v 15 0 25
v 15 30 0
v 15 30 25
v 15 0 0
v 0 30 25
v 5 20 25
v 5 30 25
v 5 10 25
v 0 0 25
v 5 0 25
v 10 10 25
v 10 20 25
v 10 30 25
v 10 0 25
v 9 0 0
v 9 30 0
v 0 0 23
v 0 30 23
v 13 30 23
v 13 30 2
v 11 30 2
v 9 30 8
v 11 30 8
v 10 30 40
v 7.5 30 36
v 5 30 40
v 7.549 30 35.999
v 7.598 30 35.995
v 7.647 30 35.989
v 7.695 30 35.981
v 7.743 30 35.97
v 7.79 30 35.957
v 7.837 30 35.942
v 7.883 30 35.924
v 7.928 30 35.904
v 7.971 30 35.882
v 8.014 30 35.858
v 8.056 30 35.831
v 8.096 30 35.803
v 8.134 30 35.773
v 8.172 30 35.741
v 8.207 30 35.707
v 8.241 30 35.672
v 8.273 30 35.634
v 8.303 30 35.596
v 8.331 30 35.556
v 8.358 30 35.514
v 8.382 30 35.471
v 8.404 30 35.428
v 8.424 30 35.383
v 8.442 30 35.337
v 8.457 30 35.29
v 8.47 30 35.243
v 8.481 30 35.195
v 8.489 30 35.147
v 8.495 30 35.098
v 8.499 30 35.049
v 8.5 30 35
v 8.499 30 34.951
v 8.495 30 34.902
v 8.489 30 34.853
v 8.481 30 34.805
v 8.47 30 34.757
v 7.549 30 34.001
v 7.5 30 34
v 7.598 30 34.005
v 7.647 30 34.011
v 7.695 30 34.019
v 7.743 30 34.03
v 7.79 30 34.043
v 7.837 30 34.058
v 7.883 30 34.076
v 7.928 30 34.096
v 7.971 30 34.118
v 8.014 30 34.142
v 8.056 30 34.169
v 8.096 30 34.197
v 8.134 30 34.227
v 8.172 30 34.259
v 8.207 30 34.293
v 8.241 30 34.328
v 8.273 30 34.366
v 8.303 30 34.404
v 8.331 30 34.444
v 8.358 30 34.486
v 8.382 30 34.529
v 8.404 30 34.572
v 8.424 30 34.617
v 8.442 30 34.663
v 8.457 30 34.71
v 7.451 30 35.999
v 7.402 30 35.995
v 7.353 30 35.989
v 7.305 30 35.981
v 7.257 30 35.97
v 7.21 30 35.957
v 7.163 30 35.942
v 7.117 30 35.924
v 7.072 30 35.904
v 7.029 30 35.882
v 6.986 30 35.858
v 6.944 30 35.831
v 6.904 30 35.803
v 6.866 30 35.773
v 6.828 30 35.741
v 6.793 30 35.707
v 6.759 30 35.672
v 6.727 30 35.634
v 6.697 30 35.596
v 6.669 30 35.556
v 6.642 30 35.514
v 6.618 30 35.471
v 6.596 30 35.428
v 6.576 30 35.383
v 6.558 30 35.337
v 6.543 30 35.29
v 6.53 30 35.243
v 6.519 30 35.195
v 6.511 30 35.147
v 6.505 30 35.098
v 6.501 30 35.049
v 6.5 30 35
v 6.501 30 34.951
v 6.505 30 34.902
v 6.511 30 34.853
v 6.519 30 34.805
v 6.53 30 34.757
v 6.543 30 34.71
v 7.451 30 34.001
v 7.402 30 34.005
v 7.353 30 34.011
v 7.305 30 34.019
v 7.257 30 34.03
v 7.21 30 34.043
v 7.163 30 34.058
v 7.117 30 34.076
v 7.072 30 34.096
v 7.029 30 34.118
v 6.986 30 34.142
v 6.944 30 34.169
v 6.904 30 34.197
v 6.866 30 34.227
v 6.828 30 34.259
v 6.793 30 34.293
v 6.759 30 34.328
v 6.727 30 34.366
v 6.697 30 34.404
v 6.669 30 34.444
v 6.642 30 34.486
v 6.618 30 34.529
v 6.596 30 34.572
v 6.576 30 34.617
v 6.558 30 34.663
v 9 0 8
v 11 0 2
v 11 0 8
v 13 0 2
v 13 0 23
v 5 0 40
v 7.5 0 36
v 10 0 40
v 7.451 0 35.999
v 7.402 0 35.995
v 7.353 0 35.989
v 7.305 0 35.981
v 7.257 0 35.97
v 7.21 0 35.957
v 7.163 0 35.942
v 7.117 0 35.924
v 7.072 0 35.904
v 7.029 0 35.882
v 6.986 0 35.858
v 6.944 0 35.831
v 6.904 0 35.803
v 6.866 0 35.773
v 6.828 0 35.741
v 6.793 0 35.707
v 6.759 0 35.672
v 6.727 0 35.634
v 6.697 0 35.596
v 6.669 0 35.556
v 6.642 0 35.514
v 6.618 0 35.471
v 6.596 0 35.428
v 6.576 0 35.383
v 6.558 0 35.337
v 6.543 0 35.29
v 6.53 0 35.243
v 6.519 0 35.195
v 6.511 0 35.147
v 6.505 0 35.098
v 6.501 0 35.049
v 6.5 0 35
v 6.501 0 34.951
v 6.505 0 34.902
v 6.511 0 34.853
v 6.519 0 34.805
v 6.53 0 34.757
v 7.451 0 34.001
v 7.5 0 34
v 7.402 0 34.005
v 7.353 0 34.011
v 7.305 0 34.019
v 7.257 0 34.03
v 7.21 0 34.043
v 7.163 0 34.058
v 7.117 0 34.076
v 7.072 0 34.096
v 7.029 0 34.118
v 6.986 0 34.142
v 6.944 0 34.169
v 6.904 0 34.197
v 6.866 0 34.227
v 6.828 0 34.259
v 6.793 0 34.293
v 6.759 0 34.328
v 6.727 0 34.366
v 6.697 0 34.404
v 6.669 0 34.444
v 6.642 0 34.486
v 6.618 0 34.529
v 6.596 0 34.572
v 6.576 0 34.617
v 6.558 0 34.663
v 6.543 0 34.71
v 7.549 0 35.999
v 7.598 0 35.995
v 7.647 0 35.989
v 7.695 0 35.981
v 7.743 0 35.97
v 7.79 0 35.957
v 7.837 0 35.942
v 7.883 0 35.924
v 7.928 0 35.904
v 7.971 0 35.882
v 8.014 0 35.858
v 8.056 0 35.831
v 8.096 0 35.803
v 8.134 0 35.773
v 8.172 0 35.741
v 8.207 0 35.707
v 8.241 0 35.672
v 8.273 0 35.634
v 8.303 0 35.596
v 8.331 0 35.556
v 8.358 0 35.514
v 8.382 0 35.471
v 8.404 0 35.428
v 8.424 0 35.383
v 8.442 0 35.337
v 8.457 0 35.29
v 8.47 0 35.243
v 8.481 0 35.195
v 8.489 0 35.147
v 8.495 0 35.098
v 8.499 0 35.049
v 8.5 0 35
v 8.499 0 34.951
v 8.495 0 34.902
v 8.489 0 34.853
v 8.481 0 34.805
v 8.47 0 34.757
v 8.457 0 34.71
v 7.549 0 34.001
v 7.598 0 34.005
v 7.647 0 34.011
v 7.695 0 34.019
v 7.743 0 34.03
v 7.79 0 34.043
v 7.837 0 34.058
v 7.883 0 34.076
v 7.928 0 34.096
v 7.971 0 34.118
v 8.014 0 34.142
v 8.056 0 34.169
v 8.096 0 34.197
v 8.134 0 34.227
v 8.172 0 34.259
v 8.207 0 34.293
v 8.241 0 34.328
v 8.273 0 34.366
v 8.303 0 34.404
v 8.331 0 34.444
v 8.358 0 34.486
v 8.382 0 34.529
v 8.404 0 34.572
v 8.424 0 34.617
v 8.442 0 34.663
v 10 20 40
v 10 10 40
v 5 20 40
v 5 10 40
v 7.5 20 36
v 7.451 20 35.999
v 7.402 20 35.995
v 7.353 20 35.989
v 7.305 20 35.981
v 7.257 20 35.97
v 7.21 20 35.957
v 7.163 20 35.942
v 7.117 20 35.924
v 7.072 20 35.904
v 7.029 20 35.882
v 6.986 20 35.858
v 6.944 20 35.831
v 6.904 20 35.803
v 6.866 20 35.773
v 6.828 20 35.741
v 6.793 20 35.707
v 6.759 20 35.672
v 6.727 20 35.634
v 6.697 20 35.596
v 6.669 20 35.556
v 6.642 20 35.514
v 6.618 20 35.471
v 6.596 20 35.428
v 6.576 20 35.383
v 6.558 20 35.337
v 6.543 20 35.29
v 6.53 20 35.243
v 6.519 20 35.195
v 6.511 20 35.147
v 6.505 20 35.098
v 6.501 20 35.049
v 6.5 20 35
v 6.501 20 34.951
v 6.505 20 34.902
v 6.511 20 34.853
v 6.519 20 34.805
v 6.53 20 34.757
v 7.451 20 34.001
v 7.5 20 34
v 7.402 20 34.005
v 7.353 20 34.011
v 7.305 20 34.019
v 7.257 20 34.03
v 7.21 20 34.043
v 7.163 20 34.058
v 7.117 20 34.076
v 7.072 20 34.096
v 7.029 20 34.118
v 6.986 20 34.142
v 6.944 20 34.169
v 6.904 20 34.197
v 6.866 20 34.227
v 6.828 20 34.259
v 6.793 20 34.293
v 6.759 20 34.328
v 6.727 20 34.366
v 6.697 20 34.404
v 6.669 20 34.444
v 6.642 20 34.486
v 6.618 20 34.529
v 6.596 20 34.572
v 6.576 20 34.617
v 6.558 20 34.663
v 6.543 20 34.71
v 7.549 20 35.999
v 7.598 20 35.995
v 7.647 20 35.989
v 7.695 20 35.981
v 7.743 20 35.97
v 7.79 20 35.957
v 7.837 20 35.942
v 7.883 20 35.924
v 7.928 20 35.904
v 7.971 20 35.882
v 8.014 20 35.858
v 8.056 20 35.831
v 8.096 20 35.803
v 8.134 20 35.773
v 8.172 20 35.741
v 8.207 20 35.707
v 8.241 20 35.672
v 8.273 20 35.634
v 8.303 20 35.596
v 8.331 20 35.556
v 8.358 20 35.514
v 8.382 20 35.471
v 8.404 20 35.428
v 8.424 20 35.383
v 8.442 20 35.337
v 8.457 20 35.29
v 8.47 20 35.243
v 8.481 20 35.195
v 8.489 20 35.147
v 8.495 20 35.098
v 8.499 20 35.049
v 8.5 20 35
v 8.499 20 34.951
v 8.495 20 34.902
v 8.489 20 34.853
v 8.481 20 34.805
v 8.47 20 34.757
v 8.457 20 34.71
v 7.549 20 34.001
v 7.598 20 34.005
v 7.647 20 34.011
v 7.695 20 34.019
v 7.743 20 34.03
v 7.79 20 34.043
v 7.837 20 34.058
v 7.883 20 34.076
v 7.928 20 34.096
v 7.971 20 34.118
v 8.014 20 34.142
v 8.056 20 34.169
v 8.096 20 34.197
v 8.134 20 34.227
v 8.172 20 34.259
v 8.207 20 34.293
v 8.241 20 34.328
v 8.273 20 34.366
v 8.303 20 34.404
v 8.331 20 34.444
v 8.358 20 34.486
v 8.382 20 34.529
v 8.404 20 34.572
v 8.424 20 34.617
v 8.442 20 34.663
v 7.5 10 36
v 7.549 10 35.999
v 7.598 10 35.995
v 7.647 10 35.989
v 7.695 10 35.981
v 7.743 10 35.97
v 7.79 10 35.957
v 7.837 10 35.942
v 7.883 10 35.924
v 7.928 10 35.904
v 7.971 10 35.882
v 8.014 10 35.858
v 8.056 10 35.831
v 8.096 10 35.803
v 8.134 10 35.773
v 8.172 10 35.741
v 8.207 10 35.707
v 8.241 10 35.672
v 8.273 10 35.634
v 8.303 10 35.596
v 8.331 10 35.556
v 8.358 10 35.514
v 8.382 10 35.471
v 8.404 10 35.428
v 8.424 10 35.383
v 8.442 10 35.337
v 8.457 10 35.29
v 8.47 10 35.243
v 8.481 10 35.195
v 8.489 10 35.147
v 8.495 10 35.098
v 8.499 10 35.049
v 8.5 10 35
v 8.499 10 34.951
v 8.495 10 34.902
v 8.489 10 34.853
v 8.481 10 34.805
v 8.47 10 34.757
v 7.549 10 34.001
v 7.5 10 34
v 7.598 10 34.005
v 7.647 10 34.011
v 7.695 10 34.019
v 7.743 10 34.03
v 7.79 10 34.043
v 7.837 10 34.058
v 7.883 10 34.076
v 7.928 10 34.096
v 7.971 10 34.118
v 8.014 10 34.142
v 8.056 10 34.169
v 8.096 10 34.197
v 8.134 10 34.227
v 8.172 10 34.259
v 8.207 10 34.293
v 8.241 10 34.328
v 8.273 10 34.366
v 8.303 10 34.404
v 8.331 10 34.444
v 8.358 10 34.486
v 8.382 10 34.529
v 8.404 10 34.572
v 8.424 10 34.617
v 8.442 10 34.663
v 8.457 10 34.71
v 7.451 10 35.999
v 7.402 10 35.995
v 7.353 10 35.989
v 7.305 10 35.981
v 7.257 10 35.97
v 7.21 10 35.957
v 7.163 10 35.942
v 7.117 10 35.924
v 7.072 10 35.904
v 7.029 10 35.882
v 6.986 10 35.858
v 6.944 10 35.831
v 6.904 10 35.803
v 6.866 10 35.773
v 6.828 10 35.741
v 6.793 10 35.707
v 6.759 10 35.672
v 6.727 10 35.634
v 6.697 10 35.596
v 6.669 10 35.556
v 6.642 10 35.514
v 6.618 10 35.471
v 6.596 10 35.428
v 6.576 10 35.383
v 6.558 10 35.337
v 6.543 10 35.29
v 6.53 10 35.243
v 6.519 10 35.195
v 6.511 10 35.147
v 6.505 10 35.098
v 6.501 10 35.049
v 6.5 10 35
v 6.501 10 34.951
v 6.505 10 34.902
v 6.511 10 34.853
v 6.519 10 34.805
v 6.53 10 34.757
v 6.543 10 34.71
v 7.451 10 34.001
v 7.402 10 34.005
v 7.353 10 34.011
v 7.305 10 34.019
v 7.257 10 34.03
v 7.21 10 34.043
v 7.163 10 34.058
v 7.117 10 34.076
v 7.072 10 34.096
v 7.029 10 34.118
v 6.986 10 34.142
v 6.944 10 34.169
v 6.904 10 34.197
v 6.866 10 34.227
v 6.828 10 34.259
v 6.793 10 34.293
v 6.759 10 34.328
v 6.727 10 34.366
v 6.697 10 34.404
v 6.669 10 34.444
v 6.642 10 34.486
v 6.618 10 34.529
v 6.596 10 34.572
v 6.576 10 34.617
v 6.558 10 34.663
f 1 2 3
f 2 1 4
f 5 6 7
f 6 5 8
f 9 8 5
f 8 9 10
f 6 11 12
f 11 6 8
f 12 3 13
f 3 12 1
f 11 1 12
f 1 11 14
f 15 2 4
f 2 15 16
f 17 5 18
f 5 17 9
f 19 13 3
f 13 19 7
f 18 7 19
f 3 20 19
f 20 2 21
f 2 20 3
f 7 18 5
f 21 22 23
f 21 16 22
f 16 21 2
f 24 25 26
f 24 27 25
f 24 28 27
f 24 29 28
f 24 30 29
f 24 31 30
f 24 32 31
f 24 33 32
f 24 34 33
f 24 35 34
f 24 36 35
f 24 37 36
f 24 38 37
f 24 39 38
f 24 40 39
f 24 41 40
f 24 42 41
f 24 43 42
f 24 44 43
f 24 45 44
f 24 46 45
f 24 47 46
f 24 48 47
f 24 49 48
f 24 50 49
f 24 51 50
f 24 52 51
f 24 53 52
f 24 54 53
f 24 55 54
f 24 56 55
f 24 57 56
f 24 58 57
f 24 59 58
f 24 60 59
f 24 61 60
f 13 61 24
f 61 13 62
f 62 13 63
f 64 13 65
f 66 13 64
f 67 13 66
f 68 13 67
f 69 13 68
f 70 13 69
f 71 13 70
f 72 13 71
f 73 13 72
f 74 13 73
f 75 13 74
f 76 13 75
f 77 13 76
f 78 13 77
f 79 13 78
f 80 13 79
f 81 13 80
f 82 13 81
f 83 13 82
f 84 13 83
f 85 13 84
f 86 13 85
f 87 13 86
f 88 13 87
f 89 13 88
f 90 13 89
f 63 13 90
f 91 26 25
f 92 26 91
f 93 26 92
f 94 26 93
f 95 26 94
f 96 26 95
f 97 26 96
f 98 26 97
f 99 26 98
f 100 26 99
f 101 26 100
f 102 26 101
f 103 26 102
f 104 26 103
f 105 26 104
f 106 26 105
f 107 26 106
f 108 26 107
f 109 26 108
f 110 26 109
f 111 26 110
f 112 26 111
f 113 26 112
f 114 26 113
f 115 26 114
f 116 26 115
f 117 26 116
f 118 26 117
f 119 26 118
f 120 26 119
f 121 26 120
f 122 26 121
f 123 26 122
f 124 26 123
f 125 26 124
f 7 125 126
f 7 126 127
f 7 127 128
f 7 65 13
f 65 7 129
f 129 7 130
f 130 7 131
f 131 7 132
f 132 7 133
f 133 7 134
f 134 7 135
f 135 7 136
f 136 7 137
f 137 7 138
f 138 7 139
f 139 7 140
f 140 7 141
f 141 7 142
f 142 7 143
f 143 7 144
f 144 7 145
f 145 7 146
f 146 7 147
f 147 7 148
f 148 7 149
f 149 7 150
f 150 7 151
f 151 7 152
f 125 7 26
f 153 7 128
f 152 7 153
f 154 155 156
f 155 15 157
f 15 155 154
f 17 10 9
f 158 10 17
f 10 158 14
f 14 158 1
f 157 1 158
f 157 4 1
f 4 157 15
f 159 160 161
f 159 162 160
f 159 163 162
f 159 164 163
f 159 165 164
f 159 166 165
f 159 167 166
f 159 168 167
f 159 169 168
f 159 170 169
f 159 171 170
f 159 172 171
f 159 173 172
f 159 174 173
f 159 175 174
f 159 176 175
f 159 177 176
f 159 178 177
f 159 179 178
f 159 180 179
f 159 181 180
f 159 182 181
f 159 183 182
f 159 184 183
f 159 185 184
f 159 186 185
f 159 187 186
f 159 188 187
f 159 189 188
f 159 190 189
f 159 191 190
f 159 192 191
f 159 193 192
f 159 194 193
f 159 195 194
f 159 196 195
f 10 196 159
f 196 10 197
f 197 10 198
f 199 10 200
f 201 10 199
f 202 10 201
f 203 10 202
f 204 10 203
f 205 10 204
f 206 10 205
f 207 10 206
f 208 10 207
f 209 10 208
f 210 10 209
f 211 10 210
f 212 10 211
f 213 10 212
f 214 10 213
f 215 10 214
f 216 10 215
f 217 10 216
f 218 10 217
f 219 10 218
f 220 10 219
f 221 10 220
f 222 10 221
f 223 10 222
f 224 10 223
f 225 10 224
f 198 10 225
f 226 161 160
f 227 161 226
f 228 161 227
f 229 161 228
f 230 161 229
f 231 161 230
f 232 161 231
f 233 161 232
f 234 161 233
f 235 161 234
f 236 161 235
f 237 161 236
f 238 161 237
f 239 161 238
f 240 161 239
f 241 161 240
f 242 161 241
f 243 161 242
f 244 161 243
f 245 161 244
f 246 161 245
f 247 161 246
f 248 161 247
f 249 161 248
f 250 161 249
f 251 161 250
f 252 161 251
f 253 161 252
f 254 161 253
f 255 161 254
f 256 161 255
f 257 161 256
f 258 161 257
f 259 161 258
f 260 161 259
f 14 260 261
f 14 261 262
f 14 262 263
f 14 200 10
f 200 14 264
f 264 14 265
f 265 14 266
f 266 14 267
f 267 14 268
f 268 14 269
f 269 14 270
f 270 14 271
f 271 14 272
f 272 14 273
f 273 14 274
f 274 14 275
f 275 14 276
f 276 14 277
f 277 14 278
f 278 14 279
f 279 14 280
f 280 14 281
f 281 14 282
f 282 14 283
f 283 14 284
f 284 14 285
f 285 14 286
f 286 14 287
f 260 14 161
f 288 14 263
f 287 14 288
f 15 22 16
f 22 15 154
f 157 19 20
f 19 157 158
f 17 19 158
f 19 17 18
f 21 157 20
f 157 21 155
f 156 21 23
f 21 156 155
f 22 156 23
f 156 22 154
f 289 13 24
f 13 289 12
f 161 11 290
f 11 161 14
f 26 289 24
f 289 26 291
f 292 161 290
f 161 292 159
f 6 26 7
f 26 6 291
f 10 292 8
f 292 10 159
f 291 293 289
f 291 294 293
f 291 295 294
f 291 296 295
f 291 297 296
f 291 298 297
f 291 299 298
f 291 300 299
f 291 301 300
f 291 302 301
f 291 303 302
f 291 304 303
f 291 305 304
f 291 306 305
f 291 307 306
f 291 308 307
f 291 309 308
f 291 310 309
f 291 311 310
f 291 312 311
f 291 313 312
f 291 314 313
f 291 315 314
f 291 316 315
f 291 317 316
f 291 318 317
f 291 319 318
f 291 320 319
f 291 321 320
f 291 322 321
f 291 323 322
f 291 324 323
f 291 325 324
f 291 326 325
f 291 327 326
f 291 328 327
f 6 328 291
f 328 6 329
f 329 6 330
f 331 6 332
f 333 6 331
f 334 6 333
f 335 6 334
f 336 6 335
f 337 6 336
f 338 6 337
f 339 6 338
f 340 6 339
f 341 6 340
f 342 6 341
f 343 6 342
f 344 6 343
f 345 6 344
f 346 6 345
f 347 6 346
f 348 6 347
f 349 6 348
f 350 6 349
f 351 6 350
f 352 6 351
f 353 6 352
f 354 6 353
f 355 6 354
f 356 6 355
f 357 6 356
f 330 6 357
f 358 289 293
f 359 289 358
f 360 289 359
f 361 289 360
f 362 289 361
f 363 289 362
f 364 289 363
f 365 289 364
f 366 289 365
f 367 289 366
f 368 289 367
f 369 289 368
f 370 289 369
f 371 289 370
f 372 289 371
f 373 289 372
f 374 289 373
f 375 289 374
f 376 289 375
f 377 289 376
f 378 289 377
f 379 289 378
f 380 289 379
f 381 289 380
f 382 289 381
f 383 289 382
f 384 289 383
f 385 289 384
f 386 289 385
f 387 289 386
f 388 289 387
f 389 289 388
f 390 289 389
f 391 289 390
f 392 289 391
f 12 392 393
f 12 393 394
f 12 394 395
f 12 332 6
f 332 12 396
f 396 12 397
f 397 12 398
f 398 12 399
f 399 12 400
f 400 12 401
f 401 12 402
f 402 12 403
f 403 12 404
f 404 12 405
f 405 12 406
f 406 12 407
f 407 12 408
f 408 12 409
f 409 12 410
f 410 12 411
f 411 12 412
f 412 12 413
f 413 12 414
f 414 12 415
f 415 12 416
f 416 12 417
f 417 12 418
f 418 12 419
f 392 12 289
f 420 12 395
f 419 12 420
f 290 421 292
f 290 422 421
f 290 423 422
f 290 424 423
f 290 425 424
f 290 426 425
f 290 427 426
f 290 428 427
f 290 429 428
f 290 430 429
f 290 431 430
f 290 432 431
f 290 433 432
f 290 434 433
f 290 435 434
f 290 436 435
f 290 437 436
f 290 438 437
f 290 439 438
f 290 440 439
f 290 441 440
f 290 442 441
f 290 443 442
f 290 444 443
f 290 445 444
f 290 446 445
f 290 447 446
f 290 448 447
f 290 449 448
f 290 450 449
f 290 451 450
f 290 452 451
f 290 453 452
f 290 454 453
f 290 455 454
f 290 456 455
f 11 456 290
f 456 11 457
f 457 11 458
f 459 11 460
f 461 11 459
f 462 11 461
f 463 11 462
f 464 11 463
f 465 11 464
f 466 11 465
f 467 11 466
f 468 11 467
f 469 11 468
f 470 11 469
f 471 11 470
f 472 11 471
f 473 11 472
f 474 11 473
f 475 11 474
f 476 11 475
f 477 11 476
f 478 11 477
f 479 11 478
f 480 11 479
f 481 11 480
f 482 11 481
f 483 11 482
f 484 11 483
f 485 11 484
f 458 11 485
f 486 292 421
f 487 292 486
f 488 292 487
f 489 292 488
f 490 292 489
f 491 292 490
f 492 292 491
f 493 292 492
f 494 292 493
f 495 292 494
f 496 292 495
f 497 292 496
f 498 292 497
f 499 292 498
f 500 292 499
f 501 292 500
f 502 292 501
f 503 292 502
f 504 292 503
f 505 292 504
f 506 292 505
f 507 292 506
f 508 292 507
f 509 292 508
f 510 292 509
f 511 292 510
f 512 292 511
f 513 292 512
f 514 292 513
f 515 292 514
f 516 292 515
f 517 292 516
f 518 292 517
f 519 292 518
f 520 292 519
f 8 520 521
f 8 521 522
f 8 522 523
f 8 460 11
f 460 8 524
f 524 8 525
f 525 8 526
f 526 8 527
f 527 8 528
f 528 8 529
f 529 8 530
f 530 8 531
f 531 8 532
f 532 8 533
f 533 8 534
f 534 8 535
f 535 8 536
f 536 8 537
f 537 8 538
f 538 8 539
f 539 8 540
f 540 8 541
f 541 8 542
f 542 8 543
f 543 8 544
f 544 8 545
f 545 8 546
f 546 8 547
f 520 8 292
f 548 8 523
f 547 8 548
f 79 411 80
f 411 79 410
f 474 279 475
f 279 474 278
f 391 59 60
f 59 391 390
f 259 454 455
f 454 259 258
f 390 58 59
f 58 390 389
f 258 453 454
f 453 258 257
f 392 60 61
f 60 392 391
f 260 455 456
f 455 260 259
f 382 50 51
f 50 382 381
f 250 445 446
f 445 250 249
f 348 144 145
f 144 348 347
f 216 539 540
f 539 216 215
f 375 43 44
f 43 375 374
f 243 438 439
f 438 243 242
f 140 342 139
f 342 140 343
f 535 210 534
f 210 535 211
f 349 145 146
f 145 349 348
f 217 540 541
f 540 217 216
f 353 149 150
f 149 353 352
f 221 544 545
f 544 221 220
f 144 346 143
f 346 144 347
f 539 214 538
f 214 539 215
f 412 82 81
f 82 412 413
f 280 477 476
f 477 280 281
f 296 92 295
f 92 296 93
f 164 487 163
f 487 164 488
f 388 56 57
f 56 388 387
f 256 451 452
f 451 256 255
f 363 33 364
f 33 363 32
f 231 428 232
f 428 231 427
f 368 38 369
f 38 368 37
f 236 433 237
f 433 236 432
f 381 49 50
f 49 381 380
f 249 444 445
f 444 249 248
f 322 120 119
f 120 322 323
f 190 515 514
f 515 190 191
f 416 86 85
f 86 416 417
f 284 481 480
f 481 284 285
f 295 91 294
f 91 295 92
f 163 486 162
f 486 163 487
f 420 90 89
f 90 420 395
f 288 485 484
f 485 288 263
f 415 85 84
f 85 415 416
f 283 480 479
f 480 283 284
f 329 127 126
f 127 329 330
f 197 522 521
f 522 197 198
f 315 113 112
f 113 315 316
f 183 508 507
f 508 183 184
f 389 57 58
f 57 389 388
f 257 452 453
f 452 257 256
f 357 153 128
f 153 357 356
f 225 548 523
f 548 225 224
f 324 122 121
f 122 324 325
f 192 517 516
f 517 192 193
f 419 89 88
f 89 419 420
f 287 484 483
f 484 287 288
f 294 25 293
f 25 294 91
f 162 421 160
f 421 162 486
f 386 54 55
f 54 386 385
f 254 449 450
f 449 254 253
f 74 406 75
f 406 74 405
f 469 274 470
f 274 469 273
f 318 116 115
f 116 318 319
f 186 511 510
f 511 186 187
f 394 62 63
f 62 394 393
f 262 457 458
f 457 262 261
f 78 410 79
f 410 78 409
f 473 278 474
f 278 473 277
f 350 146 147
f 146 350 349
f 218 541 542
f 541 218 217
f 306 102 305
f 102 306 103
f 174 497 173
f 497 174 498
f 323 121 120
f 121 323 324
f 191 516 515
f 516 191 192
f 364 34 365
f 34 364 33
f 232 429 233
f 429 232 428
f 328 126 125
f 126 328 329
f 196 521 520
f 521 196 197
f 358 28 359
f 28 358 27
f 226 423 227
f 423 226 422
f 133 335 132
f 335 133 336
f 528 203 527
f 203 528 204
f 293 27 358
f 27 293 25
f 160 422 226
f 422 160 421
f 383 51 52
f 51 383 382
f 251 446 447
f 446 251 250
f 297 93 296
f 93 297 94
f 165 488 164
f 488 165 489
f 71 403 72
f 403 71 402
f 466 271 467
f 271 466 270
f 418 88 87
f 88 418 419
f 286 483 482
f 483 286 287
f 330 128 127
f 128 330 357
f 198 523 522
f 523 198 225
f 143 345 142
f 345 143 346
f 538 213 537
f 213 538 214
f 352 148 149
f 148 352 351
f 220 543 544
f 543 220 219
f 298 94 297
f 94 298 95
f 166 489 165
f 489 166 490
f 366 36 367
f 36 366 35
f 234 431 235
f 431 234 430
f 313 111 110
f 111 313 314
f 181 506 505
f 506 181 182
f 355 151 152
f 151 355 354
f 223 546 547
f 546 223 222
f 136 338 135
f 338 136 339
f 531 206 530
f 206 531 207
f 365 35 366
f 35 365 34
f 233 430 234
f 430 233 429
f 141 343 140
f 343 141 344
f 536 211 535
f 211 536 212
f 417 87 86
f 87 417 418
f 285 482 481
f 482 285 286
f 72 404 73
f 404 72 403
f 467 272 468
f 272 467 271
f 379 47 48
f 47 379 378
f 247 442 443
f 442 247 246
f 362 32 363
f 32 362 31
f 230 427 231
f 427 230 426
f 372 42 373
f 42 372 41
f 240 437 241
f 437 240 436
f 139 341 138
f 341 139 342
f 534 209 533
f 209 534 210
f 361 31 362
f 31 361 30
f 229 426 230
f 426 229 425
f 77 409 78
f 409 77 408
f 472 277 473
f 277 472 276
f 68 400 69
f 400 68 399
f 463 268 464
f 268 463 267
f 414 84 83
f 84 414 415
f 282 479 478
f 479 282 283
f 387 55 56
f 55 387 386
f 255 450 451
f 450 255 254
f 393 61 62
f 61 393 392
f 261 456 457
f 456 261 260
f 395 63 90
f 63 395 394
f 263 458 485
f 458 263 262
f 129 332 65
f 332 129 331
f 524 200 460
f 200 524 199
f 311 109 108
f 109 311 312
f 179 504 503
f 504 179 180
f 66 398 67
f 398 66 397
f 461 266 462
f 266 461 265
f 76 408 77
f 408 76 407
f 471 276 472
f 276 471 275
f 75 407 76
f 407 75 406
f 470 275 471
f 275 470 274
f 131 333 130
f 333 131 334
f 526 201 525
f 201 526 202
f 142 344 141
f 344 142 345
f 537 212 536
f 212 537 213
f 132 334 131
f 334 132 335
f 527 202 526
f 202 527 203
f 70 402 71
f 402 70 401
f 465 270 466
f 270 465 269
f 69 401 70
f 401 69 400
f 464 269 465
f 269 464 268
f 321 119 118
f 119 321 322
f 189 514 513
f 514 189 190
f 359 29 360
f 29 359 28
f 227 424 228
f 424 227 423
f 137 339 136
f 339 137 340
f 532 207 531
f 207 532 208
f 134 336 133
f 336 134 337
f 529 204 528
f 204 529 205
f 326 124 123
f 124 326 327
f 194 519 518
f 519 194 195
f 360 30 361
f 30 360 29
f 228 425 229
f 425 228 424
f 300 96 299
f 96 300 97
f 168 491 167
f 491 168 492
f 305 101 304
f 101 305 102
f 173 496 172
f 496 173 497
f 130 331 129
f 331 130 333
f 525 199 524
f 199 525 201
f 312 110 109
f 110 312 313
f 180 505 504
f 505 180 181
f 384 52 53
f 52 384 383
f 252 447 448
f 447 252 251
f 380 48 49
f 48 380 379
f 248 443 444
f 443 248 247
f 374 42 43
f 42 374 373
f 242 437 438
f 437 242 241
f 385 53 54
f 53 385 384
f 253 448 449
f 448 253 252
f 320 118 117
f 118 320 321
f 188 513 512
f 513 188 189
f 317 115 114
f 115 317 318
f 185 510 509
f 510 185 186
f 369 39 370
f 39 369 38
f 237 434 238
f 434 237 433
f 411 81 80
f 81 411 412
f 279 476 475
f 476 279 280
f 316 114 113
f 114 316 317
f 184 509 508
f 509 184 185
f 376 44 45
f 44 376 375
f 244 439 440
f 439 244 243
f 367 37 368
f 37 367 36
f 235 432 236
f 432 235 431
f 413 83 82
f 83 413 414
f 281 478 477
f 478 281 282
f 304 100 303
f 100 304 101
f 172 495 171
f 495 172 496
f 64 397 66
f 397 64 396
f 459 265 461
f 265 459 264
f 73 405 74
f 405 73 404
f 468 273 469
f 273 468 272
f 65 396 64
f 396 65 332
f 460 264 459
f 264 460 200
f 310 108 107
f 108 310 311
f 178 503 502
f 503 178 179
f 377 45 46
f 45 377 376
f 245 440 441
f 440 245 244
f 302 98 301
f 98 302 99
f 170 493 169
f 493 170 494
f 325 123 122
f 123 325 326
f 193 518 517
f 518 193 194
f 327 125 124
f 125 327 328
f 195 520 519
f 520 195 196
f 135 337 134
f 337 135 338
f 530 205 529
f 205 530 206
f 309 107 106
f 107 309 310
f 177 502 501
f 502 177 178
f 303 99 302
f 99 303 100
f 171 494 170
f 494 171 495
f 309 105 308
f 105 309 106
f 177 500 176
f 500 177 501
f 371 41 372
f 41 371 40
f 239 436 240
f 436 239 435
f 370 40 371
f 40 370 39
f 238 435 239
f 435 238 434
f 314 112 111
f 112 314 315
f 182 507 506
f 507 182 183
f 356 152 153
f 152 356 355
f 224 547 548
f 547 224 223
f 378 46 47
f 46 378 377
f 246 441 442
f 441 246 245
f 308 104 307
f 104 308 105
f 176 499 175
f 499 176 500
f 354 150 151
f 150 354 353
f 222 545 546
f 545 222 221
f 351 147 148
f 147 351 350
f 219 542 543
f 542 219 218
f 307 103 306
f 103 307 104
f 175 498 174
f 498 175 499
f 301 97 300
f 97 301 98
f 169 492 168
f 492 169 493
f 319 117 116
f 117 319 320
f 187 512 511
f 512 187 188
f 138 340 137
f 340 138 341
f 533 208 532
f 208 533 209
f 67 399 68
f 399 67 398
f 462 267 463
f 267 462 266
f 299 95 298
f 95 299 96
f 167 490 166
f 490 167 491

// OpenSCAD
$fn=128;
difference()
{
    cube([15,30,25]);
    translate([-1,-1,-5]) cube([10,32,23]);
    translate([11,-1,2]) cube([2,32,21]);
    translate([-3,-1,8]) cube([15,32,15]);
}
difference()
{
    translate([5,0,25]) cube([5,30,15]);
    translate([4,10,25]) cube([7,10,18]);
    translate([7.5,-10,35]) rotate([-90,0,0]) cylinder(d=2,h=45);
}
